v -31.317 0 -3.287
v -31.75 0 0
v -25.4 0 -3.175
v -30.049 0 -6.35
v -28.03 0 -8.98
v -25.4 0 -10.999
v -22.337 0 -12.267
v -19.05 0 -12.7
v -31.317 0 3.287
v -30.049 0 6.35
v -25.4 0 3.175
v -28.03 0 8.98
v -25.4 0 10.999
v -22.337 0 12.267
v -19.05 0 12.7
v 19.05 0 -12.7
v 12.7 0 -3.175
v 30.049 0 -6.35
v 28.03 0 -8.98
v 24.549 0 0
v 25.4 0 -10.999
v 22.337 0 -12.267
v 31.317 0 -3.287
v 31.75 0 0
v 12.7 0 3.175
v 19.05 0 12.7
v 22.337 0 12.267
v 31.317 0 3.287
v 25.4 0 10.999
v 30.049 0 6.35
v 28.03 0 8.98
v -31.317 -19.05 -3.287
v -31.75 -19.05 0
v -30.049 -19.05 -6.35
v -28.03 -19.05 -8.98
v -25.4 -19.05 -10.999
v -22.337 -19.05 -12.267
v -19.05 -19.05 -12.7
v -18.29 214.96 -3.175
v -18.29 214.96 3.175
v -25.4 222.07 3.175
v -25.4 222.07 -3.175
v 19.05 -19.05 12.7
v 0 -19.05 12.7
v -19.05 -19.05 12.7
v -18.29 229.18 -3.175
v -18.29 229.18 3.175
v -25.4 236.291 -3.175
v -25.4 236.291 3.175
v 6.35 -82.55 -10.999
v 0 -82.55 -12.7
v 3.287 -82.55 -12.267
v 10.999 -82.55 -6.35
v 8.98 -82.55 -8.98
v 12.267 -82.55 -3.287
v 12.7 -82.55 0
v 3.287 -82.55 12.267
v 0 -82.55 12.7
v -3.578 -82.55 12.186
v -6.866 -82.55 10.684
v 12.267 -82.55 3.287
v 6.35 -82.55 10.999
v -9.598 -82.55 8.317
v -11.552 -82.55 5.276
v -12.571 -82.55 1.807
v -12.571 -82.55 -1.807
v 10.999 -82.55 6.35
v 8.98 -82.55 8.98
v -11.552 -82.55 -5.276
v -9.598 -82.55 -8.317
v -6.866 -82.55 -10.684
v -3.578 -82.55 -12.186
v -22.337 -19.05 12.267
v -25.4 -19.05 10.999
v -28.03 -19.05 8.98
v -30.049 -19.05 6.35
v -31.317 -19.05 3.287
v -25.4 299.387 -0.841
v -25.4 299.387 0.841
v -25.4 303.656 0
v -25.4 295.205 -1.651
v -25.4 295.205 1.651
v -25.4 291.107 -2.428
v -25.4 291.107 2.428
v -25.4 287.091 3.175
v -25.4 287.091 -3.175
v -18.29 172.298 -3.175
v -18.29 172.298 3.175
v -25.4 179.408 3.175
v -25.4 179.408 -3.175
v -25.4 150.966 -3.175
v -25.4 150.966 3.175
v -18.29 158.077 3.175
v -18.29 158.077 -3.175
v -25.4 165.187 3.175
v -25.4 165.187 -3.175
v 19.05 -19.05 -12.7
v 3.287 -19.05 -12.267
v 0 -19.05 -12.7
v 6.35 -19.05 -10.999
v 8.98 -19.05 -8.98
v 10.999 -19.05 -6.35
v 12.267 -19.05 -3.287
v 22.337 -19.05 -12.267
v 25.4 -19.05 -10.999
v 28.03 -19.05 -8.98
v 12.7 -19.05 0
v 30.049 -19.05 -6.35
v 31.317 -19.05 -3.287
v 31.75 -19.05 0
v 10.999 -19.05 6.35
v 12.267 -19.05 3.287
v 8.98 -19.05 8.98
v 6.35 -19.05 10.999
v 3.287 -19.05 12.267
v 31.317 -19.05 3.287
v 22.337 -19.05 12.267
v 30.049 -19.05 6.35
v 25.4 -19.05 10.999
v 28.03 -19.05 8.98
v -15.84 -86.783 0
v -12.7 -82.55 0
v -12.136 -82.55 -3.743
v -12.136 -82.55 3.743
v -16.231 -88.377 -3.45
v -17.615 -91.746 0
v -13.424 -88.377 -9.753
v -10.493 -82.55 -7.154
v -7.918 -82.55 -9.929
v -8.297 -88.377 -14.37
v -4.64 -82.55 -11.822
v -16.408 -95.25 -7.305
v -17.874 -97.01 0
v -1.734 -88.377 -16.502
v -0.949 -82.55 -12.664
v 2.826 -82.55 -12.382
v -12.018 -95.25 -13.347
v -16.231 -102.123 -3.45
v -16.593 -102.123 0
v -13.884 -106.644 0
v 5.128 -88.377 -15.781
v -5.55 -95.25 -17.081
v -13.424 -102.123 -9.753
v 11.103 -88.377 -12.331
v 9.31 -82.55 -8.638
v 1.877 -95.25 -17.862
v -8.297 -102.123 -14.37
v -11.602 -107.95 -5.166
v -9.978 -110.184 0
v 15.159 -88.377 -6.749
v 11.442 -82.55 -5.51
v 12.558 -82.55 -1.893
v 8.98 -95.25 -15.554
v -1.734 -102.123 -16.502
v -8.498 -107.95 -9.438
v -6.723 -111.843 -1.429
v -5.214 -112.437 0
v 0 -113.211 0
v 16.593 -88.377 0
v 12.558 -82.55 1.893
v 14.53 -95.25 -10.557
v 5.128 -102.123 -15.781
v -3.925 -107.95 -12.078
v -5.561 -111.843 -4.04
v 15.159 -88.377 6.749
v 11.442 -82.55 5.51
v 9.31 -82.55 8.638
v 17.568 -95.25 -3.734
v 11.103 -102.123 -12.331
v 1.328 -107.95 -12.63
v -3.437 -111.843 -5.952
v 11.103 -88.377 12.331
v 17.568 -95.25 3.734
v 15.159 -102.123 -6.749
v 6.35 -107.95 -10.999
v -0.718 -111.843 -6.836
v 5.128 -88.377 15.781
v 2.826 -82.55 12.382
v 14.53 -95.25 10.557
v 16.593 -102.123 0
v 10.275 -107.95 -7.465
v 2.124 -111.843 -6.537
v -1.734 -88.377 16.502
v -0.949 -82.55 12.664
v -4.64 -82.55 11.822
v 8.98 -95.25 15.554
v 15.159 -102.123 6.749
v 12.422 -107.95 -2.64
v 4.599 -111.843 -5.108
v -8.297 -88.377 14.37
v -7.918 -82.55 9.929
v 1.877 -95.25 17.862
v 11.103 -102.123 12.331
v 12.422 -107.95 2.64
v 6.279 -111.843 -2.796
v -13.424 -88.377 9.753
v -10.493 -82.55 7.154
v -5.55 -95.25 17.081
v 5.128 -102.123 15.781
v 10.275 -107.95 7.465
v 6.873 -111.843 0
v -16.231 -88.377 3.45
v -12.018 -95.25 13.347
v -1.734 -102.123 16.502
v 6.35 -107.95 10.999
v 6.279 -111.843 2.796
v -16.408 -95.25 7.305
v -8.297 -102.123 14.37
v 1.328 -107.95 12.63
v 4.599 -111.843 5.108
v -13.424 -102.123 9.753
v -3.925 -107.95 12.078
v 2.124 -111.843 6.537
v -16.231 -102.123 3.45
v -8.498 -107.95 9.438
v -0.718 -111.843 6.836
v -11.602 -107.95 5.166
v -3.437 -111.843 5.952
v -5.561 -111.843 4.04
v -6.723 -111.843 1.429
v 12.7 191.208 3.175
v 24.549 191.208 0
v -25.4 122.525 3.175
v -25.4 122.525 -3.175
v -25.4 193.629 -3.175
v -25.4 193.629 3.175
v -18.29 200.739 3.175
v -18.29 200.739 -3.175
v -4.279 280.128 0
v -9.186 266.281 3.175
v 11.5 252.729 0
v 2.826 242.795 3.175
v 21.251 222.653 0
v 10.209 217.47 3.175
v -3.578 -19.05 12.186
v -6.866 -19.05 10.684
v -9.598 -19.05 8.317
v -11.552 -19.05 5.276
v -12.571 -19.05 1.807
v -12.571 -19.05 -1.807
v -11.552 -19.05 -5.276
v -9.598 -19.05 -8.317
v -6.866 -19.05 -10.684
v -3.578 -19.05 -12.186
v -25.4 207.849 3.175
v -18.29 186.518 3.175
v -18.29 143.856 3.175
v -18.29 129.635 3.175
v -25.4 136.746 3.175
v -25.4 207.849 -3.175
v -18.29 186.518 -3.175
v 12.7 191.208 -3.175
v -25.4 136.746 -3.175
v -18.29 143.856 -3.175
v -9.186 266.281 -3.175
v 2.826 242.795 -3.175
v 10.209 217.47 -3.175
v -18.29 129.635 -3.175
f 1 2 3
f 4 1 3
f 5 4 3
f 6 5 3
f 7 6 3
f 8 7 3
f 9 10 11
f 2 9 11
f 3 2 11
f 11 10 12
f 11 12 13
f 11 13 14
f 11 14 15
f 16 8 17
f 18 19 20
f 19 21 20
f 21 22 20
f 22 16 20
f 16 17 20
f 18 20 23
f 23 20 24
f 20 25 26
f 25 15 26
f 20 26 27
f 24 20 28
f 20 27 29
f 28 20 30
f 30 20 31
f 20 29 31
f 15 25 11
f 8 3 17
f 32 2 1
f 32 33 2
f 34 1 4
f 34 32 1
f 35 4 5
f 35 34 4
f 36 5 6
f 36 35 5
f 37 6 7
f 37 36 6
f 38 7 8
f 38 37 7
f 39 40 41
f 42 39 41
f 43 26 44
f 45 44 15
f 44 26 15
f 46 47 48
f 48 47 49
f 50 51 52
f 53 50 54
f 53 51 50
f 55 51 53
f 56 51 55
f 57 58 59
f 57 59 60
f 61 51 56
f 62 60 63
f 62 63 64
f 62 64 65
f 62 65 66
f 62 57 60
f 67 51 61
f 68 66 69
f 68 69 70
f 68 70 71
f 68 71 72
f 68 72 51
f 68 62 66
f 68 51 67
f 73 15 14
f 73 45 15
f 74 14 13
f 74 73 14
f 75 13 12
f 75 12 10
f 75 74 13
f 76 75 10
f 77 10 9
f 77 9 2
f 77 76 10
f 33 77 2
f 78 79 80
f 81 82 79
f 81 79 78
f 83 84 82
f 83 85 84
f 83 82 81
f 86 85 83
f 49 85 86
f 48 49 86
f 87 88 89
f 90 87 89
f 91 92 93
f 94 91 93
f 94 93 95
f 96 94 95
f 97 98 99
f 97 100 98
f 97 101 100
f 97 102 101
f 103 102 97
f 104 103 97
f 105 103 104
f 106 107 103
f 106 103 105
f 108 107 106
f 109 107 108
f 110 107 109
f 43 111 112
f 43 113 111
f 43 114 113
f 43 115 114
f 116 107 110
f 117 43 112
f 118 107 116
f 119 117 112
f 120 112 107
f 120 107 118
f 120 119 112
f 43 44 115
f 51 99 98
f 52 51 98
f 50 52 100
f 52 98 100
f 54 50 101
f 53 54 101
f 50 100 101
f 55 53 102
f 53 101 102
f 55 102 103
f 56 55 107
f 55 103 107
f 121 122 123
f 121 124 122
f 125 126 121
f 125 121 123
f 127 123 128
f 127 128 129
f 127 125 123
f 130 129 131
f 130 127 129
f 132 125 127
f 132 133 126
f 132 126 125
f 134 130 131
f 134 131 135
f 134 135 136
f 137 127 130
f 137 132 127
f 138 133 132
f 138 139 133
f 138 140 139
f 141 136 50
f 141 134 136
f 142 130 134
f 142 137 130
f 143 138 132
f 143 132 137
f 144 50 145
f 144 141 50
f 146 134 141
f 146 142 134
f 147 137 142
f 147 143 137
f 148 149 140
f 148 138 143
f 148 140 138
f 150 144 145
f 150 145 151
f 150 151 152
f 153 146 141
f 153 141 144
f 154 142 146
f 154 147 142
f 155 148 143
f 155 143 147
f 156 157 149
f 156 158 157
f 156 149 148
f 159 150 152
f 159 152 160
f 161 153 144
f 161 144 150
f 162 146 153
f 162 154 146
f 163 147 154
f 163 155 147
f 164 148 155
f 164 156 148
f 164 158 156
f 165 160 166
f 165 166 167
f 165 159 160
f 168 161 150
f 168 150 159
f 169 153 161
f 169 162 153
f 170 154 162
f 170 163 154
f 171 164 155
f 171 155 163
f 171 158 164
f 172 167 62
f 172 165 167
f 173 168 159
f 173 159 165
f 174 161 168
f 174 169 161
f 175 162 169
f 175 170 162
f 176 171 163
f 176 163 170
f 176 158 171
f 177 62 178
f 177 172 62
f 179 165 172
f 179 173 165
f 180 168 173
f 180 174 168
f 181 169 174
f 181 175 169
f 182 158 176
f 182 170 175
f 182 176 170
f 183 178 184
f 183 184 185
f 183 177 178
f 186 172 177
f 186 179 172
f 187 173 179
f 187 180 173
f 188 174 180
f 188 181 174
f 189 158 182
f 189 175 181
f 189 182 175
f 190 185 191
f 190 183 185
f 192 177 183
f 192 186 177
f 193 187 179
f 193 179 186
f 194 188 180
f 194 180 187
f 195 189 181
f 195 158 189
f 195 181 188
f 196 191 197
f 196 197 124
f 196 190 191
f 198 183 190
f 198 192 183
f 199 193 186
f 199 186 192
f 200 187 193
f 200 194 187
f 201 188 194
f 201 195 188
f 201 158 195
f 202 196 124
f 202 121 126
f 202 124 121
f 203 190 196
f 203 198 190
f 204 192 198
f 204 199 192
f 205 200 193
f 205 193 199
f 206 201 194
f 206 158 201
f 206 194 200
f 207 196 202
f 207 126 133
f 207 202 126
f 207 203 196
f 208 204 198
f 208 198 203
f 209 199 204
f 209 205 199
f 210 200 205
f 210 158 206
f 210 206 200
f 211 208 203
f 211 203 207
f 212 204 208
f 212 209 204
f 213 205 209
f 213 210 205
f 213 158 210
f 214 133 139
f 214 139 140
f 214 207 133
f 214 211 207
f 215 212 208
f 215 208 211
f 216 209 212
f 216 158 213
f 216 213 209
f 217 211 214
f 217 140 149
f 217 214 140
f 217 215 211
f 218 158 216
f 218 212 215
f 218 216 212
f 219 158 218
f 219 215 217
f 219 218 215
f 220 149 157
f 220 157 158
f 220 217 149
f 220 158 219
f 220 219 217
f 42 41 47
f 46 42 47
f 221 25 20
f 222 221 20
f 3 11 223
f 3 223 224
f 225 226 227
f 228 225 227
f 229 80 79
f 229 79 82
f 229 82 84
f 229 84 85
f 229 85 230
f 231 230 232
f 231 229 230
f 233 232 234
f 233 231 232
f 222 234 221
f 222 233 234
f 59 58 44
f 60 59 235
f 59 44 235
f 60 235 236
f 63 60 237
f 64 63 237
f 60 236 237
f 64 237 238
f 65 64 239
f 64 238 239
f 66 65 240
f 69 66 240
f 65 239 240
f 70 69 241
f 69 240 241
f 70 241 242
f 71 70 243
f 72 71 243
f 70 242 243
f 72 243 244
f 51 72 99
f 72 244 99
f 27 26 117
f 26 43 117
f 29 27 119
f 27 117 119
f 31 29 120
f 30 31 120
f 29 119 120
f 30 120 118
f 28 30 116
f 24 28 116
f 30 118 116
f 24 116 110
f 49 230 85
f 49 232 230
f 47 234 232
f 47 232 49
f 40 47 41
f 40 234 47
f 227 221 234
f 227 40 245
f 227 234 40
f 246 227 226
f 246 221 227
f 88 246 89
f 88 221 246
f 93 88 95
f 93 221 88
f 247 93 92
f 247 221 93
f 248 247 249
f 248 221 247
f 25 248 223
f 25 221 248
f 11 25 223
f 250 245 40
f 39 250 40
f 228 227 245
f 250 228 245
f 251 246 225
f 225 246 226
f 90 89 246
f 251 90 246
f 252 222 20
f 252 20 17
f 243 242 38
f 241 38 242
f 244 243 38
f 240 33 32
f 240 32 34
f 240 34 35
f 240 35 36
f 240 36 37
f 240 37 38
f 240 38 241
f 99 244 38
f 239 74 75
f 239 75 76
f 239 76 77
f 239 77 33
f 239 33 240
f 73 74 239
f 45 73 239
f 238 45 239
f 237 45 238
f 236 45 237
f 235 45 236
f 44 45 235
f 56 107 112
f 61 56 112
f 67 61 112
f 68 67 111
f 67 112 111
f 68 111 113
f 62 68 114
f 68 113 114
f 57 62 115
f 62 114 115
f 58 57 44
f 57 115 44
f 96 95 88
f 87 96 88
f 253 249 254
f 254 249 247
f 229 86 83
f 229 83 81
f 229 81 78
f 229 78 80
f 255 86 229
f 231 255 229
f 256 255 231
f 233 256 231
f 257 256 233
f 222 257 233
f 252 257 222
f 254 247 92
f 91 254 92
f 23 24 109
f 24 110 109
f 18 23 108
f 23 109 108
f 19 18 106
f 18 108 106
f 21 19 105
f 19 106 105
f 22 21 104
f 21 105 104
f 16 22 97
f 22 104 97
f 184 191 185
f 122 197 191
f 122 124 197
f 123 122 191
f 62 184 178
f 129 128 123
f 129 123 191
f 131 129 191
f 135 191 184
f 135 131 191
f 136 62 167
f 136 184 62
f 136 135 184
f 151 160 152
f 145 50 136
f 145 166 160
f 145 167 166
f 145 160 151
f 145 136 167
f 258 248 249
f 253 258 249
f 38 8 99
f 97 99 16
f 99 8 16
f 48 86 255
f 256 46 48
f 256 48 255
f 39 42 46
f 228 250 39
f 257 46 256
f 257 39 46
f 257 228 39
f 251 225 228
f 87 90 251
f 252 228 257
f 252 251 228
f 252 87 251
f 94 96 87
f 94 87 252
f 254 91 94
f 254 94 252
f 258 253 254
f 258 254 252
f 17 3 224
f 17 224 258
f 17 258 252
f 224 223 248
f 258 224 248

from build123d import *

# Parameters (mm, degrees)
F1_DEPTH    = 304.8
F2_T1_DEPTH = 574.3112662849
F3_T1_DEPTH = 224.1861106845
F3_T4_ANGLE = 60.5895449389
F3_T6_ANGLE = 60.5895449389
F5_DEPTH    = 19.05
F7_DEPTH    = 63.5
F8_R        = 12.69999
F12_DEPTH   = 25.4


# Not quite as in the source:
# - a fillet or chamfer that OpenCascade refuses, or shapes differently, is made with other operations: its cross-section is extruded or revolved along the edge and cut away or added
# - a fillet or chamfer is up to 0.001 mm smaller than in the source, because OpenCascade refuses the exact size


with BuildPart() as f1:
    # F0 (on Front) → F1 (new body)
    with BuildSketch(Plane.XZ):
        Polygon((-25.4, 0), (0, 0), (25.4, 0), (25.4, 3.175), (-25.4, 3.175), align=None)
        Polygon((25.4, 0), (0, 0), (-25.4, 0), (-25.4, -3.175), (25.4, -3.175), align=None)
    extrude(amount=-F1_DEPTH)

    # F2: fillet of radius 152.4 on 1 edges, made by hand

    # F2_s2 → F2_t1 (cut)
    with BuildSketch(Plane.XY.offset(-287.1556331425)):
        with BuildLine():
            ThreePointArc((25.4, 191.207746743), (12.1215296063, 253.4247862097), (-25.4, 304.8))
            Line((-25.4, 304.8), (25.4, 304.8))
            Line((25.4, 304.8), (25.4, 191.207746743))
        make_face()
    extrude(amount=F2_T1_DEPTH, mode=Mode.SUBTRACT)

    # F3: chamfer of 12.7 x 3.4029547439 on 4 edges, made by hand

    # F3_s2 → F3_t1 (cut)
    with BuildSketch(Plane.XZ.offset(-191.207746743)):
        Polygon((12.7, 3.175), (25.4, -0.2279547439), (25.4, 3.175), align=None)
        Polygon((25.4, 0.2279547439), (12.7, -3.175), (25.4, -3.175), align=None)
    extrude(amount=F3_T1_DEPTH, mode=Mode.SUBTRACT)

    # F3_s3 → F3_t4 (revolve, cut)
    with BuildSketch(Plane(origin=(-178.1690956727, 100.4359641468, 0), x_dir=(0, 0, 1), z_dir=(-0.8711242188, 0.4910627204, 0))):
        Polygon((3.175, 243.9007335274), (-0.2279547439, 256.6007335274), (3.175, 256.6007335274), align=None)
    revolve(axis=Axis((-127.0000000001, 191.207746743, 3.175), (0, 0, -1)), revolution_arc=F3_T4_ANGLE, mode=Mode.SUBTRACT)

    # F3_s5 → F3_t6 (revolve, cut)
    with BuildSketch(Plane(origin=(-178.1690956727, 100.4359641468, 0), x_dir=(0, 0, 1), z_dir=(-0.8711242188, 0.4910627204, 0))):
        Polygon((0.2279547439, 256.6007335274), (-3.175, 243.9007335274), (-3.175, 256.6007335274), align=None)
    revolve(axis=Axis((-127.0000000001, 191.207746743, -3.175), (0, 0, -1)), revolution_arc=F3_T6_ANGLE, mode=Mode.SUBTRACT)

    # F4 (on face) → F5 (join)
    with BuildSketch(Plane.XZ):
        Polygon((31.75, 12.7), (0, 12.7), (-31.75, 12.7), (-31.75, -12.7), (0, -12.7), (31.75, -12.7), align=None)
        Polygon((-25.4, 3.175), (0, 3.175), (12.7, 3.175), (24.5492613139, 0), (12.7, -3.175), (-25.4, -3.175), align=None, mode=Mode.SUBTRACT)
        Polygon((12.7, 3.175), (0, 3.175), (-25.4, 3.175), (-25.4, -3.175), (12.7, -3.175), (24.5492613139, 0), align=None)
    extrude(amount=F5_DEPTH)

    # F6 (on face) → F7 (join)
    with BuildSketch(Plane.XZ.offset(19.05)):
        with BuildLine():
            ThreePointArc((0, -12.7), (8.9802561211, -8.9802561211), (12.7, 0))
            ThreePointArc((12.7, 0), (8.980256117, 8.9802561251), (-1.15e-08, 12.7))
            ThreePointArc((-1.15e-08, 12.7), (-12.7, -5.7e-09), (0, -12.7))
        make_face()
    extrude(amount=F7_DEPTH)

    # F8 (radius 12.7 in the source; OpenCascade refuses exactly that, so slightly less here)
    f8_edges = [f1.edges().sort_by_distance(p)[0] for p in [
        (-31.75, -9.525, 12.7),
        (31.75, -9.525, 12.7),
        (31.75, -9.525, -12.7),
        (-31.75, -9.525, -12.7),
    ]]
    fillet(f8_edges, radius=F8_R)

    # F11 (on face) → F12 (cut)
    with BuildSketch(Plane.XY.offset(3.175)):
        Polygon((-18.2896524204, 229.1802964913), (-25.4, 236.2906440709), (-25.4, 222.0699489117), align=None)
        Polygon((-18.2896524204, 214.959601332), (-25.4, 222.0699489117), (-25.4, 207.8492537524), align=None)
        Polygon((-18.2896524204, 200.7389061727), (-25.4, 207.8492537524), (-25.4, 193.6285585931), align=None)
        Polygon((-18.2896524204, 186.5182110135), (-25.4, 193.6285585931), (-25.4, 179.4078634338), align=None)
        Polygon((-18.2896524204, 172.2975158542), (-25.4, 179.4078634338), (-25.4, 165.1871682745), align=None)
        Polygon((-18.2896524204, 158.0768206949), (-25.4, 165.1871682745), (-25.4, 150.9664731153), align=None)
        Polygon((-25.4, 150.9664731153), (-25.4, 136.745777956), (-18.2896524204, 143.8561255356), align=None)
        Polygon((-25.4, 136.745777956), (-25.4, 122.5250827967), (-18.2896524204, 129.6354303763), align=None)
    extrude(amount=-F12_DEPTH, mode=Mode.SUBTRACT)


with BuildPart() as f10:
    # F9 (on Top) → F10 (revolve)
    with BuildSketch(Plane.XY):
        with BuildLine():
            Line((0, -113.2105122421), (0, -82.55))
            Line((0, -82.55), (-12.7, -82.55))
            ThreePointArc((-12.7, -82.55), (-16.5933496539, -102.1231904719), (0, -113.2105122421))
        make_face()
    revolve(axis=Axis((0, -97.8802561211, 0), (0, -1, 0)))


solid = Compound([f1.part, f10.part])
